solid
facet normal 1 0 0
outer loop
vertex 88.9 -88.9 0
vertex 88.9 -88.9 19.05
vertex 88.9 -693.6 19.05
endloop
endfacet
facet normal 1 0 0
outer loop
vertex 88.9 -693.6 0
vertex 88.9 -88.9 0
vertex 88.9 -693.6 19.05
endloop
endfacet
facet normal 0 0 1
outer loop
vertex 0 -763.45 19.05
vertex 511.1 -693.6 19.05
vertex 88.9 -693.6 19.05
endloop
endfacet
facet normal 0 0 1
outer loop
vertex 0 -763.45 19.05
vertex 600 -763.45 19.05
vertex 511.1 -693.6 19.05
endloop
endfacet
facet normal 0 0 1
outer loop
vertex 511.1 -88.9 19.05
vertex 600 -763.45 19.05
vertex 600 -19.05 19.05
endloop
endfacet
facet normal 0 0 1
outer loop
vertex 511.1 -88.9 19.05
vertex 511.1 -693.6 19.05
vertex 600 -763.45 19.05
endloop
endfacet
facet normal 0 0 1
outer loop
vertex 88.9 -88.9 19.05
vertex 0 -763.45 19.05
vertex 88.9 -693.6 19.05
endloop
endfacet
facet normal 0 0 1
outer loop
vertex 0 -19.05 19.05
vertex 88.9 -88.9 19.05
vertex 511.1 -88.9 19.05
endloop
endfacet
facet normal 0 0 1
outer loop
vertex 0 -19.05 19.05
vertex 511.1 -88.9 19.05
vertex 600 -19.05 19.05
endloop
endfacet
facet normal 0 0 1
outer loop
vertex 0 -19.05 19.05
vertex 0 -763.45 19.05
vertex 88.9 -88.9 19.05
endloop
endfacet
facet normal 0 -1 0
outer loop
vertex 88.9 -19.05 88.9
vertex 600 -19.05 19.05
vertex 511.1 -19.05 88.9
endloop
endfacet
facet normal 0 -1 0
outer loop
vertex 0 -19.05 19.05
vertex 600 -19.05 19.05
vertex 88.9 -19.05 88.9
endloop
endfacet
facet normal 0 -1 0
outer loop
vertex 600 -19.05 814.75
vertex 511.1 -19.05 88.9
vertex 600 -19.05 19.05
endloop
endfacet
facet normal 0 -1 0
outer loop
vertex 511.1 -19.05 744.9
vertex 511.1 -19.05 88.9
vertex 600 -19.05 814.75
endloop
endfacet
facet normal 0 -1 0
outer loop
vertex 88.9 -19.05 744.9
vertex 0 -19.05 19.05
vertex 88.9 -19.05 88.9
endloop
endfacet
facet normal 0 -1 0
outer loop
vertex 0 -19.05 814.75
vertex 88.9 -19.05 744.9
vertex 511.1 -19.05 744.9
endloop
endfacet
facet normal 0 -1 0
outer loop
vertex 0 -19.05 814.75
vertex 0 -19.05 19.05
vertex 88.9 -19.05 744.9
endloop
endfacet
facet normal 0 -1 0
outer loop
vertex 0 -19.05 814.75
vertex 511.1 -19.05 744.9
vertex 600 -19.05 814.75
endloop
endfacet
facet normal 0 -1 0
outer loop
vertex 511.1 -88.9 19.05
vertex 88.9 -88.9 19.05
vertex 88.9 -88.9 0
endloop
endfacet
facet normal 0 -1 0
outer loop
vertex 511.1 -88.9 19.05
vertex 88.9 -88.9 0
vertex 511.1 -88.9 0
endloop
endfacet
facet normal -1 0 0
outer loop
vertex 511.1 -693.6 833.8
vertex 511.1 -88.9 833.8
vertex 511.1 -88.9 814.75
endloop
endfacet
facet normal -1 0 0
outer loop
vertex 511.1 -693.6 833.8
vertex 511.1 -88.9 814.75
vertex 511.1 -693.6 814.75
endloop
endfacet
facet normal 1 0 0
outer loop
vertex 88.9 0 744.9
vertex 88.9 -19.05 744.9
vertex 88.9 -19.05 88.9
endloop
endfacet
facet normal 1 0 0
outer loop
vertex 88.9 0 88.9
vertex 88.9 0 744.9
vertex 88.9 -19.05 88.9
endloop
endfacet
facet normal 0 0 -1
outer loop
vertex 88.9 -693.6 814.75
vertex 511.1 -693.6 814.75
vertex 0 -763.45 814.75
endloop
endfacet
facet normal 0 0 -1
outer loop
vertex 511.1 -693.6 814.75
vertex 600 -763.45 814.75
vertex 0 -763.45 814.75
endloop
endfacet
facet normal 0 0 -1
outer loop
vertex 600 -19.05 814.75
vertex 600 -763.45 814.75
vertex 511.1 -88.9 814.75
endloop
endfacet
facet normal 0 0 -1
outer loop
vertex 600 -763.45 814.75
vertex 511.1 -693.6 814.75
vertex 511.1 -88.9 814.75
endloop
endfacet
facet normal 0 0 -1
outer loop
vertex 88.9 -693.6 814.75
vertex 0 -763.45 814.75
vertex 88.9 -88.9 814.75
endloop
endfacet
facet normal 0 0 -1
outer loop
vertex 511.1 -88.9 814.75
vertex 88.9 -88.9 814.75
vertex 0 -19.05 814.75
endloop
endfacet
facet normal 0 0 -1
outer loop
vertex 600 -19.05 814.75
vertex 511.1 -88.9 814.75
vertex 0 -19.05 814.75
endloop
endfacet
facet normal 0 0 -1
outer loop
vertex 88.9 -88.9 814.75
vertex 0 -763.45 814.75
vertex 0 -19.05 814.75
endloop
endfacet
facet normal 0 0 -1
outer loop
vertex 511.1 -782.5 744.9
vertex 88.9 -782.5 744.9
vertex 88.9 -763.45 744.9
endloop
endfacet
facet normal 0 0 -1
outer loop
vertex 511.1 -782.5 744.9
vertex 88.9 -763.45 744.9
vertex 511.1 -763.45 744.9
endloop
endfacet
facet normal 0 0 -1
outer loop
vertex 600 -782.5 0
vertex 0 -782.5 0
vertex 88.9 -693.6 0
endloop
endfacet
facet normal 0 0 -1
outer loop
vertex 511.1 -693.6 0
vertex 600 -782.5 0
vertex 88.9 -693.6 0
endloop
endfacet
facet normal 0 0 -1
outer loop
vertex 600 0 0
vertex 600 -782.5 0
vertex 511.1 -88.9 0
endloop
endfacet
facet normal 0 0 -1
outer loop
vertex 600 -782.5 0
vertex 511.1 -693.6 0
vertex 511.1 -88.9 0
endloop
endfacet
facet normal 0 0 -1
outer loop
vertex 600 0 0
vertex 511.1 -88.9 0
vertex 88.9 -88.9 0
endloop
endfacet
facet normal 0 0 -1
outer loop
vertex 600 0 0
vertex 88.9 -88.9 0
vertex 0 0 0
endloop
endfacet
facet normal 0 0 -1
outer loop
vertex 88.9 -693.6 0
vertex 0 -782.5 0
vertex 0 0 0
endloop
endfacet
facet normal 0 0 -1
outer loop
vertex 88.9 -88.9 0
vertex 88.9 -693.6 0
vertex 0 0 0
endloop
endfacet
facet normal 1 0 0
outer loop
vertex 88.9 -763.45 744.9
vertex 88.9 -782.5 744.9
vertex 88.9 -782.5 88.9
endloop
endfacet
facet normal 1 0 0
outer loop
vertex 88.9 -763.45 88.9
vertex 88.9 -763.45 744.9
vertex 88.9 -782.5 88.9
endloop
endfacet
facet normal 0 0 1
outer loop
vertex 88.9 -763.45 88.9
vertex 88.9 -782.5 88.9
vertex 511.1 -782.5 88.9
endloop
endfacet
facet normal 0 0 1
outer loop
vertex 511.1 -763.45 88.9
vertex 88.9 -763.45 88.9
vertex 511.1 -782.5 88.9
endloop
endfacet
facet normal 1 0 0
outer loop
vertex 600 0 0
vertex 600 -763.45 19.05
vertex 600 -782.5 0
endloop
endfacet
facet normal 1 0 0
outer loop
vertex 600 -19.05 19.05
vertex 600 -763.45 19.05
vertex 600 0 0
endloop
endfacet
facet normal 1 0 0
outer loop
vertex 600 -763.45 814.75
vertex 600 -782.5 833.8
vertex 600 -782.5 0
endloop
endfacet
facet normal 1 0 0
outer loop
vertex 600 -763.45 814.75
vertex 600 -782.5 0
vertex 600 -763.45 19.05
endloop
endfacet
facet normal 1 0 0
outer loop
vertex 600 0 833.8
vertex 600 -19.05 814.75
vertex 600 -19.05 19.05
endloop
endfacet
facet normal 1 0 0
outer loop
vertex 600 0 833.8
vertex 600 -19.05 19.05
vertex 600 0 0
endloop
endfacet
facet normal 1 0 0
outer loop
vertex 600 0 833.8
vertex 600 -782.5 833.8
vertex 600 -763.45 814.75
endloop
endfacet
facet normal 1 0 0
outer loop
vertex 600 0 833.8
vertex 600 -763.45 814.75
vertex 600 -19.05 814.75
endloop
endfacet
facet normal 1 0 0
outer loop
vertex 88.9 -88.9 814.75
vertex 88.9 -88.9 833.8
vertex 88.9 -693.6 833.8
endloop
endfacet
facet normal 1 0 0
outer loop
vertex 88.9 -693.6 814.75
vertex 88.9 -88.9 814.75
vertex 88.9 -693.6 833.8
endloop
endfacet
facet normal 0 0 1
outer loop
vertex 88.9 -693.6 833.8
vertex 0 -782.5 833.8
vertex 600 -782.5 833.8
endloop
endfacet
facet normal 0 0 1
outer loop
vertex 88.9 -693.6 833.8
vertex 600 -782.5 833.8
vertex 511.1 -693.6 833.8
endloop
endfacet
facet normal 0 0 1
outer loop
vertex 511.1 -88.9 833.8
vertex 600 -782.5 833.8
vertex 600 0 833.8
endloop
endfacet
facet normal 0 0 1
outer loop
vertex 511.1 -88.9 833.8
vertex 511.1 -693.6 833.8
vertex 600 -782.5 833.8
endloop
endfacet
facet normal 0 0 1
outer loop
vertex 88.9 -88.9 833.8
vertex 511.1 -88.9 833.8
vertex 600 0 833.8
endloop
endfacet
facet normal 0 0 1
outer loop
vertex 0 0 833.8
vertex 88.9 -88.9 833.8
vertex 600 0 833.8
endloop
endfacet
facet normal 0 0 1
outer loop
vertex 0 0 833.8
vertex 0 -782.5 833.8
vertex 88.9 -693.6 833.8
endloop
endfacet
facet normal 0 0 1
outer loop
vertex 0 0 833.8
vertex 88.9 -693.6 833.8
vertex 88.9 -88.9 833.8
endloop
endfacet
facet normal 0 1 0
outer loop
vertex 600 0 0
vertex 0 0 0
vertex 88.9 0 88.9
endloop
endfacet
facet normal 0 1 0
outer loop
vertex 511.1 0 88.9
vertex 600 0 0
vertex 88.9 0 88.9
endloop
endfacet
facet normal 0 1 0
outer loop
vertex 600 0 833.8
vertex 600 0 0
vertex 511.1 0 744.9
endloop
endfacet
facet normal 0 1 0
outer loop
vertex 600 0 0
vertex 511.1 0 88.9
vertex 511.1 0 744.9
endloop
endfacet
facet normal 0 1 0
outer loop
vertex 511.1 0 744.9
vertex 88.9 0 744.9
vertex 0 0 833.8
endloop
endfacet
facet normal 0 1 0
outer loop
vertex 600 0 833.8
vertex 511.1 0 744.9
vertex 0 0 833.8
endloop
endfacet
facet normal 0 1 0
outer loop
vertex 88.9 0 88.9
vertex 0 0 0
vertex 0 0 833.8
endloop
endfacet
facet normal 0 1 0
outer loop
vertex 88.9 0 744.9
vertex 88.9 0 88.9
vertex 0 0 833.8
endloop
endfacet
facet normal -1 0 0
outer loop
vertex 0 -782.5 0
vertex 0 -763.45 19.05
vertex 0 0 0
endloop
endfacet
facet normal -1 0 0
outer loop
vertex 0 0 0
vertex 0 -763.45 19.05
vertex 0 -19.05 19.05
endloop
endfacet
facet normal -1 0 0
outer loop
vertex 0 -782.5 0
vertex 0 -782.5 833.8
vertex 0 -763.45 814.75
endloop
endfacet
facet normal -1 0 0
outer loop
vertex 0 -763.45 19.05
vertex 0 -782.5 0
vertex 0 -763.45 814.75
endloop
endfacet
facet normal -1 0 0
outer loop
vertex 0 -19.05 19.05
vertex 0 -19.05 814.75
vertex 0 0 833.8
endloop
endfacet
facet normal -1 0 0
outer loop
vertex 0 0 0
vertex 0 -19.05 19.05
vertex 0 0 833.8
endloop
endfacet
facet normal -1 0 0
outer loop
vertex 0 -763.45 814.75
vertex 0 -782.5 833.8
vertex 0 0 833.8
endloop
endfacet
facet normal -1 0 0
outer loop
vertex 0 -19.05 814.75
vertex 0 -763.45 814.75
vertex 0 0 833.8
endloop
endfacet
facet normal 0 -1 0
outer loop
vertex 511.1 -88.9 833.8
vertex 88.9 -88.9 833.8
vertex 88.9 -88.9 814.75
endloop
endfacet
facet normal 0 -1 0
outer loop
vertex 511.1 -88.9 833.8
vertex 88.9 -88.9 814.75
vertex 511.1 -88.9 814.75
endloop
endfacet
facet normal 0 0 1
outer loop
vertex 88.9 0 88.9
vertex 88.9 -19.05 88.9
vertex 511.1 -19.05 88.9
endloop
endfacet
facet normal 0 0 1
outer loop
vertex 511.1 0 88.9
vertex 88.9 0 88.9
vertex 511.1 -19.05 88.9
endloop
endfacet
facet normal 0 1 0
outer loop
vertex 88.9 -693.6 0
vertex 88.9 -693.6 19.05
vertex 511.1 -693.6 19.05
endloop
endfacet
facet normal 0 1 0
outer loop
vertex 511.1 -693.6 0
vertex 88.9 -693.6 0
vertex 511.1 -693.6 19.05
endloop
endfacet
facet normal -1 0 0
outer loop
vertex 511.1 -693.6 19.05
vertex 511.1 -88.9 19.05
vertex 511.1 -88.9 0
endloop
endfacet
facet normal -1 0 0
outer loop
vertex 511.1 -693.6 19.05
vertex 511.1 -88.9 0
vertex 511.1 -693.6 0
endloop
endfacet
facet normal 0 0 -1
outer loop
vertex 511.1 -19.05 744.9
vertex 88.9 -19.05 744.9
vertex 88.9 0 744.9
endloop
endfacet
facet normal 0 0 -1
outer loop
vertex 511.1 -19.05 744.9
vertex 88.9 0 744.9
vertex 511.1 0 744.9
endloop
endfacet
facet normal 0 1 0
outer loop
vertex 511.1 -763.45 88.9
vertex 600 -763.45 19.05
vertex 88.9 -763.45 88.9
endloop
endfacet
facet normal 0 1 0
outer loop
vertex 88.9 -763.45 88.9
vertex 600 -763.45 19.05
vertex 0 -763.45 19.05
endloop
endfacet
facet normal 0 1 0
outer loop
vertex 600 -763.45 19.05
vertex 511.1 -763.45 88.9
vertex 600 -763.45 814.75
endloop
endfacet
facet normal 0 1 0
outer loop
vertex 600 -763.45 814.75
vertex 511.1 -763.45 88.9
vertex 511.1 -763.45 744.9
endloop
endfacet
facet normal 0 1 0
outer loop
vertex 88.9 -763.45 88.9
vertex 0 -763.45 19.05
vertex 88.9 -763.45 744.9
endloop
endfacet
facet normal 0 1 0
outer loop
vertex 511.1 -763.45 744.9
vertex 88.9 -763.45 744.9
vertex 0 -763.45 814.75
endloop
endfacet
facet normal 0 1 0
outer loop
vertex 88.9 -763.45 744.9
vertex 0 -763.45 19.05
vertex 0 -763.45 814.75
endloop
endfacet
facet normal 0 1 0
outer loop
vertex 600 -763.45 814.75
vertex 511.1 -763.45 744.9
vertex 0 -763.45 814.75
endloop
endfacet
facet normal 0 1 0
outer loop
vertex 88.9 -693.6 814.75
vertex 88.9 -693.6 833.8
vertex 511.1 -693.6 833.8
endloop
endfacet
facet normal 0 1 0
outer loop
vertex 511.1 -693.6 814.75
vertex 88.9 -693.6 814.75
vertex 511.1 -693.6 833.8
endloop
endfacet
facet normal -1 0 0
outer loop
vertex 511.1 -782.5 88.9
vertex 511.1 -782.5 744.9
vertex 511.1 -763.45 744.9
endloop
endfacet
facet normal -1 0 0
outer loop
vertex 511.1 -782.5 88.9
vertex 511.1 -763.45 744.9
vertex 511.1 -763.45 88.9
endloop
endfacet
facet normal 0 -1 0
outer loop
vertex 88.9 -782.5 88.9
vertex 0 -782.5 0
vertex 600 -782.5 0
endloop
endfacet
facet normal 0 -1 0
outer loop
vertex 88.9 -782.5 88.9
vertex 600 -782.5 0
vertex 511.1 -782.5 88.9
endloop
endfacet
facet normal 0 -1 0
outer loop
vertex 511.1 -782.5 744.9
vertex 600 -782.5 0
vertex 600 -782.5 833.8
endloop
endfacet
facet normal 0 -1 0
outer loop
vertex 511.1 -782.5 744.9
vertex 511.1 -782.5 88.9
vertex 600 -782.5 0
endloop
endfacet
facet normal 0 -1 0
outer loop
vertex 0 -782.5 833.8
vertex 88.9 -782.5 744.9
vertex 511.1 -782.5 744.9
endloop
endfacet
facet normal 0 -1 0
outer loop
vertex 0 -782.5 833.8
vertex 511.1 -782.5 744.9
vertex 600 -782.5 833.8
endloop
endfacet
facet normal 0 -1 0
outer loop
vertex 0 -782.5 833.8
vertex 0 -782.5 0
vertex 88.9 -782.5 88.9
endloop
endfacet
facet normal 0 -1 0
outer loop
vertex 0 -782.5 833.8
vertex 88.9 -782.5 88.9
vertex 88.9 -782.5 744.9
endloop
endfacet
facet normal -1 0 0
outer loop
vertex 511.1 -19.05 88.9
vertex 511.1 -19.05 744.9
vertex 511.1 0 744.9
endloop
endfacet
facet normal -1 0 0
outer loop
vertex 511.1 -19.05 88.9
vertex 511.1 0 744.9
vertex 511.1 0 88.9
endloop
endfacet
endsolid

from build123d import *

# Parameters (mm, degrees)
SKETCH_W        = 782.5
SKETCH_H        = 833.8
SKETCH_W_2      = 744.4
SKETCH_H_2      = 795.7
PAD_DEPTH       = 600
SKETCH001_W     = 656
SKETCH001_H     = 422.2
POCKET_DEPTH    = 782.501
SKETCH002_W     = 604.7
SKETCH002_H     = 422.2
POCKET001_DEPTH = 833.801


with BuildPart() as part:
    # Sketch → Pad (new body)
    with BuildSketch(Plane.YZ):
        with Locations((-391.25, 416.9)):
            Rectangle(SKETCH_W, SKETCH_H)
        with Locations((-391.25, 416.9)):
            Rectangle(SKETCH_W_2, SKETCH_H_2, mode=Mode.SUBTRACT)
    extrude(amount=PAD_DEPTH)

    # Sketch001 (on Face4 of Pad) → Pocket (cut, through all)
    with BuildSketch(Plane(origin=(0, -782.5, 0), x_dir=(0, 0, -1), z_dir=(0, -1, 0))):
        with Locations((-416.9, 300)):
            Rectangle(SKETCH001_W, SKETCH001_H)
    extrude(amount=-POCKET_DEPTH, mode=Mode.SUBTRACT)

    # Sketch002 (on Face1 of Pocket) → Pocket001 (cut, through all)
    with BuildSketch(Plane(origin=(0, 0, 833.8), x_dir=(0, -1, 0), z_dir=(0, 0, 1))):
        with Locations((391.25, 300)):
            Rectangle(SKETCH002_W, SKETCH002_H)
    extrude(amount=-POCKET001_DEPTH, mode=Mode.SUBTRACT)


solid = part.part
